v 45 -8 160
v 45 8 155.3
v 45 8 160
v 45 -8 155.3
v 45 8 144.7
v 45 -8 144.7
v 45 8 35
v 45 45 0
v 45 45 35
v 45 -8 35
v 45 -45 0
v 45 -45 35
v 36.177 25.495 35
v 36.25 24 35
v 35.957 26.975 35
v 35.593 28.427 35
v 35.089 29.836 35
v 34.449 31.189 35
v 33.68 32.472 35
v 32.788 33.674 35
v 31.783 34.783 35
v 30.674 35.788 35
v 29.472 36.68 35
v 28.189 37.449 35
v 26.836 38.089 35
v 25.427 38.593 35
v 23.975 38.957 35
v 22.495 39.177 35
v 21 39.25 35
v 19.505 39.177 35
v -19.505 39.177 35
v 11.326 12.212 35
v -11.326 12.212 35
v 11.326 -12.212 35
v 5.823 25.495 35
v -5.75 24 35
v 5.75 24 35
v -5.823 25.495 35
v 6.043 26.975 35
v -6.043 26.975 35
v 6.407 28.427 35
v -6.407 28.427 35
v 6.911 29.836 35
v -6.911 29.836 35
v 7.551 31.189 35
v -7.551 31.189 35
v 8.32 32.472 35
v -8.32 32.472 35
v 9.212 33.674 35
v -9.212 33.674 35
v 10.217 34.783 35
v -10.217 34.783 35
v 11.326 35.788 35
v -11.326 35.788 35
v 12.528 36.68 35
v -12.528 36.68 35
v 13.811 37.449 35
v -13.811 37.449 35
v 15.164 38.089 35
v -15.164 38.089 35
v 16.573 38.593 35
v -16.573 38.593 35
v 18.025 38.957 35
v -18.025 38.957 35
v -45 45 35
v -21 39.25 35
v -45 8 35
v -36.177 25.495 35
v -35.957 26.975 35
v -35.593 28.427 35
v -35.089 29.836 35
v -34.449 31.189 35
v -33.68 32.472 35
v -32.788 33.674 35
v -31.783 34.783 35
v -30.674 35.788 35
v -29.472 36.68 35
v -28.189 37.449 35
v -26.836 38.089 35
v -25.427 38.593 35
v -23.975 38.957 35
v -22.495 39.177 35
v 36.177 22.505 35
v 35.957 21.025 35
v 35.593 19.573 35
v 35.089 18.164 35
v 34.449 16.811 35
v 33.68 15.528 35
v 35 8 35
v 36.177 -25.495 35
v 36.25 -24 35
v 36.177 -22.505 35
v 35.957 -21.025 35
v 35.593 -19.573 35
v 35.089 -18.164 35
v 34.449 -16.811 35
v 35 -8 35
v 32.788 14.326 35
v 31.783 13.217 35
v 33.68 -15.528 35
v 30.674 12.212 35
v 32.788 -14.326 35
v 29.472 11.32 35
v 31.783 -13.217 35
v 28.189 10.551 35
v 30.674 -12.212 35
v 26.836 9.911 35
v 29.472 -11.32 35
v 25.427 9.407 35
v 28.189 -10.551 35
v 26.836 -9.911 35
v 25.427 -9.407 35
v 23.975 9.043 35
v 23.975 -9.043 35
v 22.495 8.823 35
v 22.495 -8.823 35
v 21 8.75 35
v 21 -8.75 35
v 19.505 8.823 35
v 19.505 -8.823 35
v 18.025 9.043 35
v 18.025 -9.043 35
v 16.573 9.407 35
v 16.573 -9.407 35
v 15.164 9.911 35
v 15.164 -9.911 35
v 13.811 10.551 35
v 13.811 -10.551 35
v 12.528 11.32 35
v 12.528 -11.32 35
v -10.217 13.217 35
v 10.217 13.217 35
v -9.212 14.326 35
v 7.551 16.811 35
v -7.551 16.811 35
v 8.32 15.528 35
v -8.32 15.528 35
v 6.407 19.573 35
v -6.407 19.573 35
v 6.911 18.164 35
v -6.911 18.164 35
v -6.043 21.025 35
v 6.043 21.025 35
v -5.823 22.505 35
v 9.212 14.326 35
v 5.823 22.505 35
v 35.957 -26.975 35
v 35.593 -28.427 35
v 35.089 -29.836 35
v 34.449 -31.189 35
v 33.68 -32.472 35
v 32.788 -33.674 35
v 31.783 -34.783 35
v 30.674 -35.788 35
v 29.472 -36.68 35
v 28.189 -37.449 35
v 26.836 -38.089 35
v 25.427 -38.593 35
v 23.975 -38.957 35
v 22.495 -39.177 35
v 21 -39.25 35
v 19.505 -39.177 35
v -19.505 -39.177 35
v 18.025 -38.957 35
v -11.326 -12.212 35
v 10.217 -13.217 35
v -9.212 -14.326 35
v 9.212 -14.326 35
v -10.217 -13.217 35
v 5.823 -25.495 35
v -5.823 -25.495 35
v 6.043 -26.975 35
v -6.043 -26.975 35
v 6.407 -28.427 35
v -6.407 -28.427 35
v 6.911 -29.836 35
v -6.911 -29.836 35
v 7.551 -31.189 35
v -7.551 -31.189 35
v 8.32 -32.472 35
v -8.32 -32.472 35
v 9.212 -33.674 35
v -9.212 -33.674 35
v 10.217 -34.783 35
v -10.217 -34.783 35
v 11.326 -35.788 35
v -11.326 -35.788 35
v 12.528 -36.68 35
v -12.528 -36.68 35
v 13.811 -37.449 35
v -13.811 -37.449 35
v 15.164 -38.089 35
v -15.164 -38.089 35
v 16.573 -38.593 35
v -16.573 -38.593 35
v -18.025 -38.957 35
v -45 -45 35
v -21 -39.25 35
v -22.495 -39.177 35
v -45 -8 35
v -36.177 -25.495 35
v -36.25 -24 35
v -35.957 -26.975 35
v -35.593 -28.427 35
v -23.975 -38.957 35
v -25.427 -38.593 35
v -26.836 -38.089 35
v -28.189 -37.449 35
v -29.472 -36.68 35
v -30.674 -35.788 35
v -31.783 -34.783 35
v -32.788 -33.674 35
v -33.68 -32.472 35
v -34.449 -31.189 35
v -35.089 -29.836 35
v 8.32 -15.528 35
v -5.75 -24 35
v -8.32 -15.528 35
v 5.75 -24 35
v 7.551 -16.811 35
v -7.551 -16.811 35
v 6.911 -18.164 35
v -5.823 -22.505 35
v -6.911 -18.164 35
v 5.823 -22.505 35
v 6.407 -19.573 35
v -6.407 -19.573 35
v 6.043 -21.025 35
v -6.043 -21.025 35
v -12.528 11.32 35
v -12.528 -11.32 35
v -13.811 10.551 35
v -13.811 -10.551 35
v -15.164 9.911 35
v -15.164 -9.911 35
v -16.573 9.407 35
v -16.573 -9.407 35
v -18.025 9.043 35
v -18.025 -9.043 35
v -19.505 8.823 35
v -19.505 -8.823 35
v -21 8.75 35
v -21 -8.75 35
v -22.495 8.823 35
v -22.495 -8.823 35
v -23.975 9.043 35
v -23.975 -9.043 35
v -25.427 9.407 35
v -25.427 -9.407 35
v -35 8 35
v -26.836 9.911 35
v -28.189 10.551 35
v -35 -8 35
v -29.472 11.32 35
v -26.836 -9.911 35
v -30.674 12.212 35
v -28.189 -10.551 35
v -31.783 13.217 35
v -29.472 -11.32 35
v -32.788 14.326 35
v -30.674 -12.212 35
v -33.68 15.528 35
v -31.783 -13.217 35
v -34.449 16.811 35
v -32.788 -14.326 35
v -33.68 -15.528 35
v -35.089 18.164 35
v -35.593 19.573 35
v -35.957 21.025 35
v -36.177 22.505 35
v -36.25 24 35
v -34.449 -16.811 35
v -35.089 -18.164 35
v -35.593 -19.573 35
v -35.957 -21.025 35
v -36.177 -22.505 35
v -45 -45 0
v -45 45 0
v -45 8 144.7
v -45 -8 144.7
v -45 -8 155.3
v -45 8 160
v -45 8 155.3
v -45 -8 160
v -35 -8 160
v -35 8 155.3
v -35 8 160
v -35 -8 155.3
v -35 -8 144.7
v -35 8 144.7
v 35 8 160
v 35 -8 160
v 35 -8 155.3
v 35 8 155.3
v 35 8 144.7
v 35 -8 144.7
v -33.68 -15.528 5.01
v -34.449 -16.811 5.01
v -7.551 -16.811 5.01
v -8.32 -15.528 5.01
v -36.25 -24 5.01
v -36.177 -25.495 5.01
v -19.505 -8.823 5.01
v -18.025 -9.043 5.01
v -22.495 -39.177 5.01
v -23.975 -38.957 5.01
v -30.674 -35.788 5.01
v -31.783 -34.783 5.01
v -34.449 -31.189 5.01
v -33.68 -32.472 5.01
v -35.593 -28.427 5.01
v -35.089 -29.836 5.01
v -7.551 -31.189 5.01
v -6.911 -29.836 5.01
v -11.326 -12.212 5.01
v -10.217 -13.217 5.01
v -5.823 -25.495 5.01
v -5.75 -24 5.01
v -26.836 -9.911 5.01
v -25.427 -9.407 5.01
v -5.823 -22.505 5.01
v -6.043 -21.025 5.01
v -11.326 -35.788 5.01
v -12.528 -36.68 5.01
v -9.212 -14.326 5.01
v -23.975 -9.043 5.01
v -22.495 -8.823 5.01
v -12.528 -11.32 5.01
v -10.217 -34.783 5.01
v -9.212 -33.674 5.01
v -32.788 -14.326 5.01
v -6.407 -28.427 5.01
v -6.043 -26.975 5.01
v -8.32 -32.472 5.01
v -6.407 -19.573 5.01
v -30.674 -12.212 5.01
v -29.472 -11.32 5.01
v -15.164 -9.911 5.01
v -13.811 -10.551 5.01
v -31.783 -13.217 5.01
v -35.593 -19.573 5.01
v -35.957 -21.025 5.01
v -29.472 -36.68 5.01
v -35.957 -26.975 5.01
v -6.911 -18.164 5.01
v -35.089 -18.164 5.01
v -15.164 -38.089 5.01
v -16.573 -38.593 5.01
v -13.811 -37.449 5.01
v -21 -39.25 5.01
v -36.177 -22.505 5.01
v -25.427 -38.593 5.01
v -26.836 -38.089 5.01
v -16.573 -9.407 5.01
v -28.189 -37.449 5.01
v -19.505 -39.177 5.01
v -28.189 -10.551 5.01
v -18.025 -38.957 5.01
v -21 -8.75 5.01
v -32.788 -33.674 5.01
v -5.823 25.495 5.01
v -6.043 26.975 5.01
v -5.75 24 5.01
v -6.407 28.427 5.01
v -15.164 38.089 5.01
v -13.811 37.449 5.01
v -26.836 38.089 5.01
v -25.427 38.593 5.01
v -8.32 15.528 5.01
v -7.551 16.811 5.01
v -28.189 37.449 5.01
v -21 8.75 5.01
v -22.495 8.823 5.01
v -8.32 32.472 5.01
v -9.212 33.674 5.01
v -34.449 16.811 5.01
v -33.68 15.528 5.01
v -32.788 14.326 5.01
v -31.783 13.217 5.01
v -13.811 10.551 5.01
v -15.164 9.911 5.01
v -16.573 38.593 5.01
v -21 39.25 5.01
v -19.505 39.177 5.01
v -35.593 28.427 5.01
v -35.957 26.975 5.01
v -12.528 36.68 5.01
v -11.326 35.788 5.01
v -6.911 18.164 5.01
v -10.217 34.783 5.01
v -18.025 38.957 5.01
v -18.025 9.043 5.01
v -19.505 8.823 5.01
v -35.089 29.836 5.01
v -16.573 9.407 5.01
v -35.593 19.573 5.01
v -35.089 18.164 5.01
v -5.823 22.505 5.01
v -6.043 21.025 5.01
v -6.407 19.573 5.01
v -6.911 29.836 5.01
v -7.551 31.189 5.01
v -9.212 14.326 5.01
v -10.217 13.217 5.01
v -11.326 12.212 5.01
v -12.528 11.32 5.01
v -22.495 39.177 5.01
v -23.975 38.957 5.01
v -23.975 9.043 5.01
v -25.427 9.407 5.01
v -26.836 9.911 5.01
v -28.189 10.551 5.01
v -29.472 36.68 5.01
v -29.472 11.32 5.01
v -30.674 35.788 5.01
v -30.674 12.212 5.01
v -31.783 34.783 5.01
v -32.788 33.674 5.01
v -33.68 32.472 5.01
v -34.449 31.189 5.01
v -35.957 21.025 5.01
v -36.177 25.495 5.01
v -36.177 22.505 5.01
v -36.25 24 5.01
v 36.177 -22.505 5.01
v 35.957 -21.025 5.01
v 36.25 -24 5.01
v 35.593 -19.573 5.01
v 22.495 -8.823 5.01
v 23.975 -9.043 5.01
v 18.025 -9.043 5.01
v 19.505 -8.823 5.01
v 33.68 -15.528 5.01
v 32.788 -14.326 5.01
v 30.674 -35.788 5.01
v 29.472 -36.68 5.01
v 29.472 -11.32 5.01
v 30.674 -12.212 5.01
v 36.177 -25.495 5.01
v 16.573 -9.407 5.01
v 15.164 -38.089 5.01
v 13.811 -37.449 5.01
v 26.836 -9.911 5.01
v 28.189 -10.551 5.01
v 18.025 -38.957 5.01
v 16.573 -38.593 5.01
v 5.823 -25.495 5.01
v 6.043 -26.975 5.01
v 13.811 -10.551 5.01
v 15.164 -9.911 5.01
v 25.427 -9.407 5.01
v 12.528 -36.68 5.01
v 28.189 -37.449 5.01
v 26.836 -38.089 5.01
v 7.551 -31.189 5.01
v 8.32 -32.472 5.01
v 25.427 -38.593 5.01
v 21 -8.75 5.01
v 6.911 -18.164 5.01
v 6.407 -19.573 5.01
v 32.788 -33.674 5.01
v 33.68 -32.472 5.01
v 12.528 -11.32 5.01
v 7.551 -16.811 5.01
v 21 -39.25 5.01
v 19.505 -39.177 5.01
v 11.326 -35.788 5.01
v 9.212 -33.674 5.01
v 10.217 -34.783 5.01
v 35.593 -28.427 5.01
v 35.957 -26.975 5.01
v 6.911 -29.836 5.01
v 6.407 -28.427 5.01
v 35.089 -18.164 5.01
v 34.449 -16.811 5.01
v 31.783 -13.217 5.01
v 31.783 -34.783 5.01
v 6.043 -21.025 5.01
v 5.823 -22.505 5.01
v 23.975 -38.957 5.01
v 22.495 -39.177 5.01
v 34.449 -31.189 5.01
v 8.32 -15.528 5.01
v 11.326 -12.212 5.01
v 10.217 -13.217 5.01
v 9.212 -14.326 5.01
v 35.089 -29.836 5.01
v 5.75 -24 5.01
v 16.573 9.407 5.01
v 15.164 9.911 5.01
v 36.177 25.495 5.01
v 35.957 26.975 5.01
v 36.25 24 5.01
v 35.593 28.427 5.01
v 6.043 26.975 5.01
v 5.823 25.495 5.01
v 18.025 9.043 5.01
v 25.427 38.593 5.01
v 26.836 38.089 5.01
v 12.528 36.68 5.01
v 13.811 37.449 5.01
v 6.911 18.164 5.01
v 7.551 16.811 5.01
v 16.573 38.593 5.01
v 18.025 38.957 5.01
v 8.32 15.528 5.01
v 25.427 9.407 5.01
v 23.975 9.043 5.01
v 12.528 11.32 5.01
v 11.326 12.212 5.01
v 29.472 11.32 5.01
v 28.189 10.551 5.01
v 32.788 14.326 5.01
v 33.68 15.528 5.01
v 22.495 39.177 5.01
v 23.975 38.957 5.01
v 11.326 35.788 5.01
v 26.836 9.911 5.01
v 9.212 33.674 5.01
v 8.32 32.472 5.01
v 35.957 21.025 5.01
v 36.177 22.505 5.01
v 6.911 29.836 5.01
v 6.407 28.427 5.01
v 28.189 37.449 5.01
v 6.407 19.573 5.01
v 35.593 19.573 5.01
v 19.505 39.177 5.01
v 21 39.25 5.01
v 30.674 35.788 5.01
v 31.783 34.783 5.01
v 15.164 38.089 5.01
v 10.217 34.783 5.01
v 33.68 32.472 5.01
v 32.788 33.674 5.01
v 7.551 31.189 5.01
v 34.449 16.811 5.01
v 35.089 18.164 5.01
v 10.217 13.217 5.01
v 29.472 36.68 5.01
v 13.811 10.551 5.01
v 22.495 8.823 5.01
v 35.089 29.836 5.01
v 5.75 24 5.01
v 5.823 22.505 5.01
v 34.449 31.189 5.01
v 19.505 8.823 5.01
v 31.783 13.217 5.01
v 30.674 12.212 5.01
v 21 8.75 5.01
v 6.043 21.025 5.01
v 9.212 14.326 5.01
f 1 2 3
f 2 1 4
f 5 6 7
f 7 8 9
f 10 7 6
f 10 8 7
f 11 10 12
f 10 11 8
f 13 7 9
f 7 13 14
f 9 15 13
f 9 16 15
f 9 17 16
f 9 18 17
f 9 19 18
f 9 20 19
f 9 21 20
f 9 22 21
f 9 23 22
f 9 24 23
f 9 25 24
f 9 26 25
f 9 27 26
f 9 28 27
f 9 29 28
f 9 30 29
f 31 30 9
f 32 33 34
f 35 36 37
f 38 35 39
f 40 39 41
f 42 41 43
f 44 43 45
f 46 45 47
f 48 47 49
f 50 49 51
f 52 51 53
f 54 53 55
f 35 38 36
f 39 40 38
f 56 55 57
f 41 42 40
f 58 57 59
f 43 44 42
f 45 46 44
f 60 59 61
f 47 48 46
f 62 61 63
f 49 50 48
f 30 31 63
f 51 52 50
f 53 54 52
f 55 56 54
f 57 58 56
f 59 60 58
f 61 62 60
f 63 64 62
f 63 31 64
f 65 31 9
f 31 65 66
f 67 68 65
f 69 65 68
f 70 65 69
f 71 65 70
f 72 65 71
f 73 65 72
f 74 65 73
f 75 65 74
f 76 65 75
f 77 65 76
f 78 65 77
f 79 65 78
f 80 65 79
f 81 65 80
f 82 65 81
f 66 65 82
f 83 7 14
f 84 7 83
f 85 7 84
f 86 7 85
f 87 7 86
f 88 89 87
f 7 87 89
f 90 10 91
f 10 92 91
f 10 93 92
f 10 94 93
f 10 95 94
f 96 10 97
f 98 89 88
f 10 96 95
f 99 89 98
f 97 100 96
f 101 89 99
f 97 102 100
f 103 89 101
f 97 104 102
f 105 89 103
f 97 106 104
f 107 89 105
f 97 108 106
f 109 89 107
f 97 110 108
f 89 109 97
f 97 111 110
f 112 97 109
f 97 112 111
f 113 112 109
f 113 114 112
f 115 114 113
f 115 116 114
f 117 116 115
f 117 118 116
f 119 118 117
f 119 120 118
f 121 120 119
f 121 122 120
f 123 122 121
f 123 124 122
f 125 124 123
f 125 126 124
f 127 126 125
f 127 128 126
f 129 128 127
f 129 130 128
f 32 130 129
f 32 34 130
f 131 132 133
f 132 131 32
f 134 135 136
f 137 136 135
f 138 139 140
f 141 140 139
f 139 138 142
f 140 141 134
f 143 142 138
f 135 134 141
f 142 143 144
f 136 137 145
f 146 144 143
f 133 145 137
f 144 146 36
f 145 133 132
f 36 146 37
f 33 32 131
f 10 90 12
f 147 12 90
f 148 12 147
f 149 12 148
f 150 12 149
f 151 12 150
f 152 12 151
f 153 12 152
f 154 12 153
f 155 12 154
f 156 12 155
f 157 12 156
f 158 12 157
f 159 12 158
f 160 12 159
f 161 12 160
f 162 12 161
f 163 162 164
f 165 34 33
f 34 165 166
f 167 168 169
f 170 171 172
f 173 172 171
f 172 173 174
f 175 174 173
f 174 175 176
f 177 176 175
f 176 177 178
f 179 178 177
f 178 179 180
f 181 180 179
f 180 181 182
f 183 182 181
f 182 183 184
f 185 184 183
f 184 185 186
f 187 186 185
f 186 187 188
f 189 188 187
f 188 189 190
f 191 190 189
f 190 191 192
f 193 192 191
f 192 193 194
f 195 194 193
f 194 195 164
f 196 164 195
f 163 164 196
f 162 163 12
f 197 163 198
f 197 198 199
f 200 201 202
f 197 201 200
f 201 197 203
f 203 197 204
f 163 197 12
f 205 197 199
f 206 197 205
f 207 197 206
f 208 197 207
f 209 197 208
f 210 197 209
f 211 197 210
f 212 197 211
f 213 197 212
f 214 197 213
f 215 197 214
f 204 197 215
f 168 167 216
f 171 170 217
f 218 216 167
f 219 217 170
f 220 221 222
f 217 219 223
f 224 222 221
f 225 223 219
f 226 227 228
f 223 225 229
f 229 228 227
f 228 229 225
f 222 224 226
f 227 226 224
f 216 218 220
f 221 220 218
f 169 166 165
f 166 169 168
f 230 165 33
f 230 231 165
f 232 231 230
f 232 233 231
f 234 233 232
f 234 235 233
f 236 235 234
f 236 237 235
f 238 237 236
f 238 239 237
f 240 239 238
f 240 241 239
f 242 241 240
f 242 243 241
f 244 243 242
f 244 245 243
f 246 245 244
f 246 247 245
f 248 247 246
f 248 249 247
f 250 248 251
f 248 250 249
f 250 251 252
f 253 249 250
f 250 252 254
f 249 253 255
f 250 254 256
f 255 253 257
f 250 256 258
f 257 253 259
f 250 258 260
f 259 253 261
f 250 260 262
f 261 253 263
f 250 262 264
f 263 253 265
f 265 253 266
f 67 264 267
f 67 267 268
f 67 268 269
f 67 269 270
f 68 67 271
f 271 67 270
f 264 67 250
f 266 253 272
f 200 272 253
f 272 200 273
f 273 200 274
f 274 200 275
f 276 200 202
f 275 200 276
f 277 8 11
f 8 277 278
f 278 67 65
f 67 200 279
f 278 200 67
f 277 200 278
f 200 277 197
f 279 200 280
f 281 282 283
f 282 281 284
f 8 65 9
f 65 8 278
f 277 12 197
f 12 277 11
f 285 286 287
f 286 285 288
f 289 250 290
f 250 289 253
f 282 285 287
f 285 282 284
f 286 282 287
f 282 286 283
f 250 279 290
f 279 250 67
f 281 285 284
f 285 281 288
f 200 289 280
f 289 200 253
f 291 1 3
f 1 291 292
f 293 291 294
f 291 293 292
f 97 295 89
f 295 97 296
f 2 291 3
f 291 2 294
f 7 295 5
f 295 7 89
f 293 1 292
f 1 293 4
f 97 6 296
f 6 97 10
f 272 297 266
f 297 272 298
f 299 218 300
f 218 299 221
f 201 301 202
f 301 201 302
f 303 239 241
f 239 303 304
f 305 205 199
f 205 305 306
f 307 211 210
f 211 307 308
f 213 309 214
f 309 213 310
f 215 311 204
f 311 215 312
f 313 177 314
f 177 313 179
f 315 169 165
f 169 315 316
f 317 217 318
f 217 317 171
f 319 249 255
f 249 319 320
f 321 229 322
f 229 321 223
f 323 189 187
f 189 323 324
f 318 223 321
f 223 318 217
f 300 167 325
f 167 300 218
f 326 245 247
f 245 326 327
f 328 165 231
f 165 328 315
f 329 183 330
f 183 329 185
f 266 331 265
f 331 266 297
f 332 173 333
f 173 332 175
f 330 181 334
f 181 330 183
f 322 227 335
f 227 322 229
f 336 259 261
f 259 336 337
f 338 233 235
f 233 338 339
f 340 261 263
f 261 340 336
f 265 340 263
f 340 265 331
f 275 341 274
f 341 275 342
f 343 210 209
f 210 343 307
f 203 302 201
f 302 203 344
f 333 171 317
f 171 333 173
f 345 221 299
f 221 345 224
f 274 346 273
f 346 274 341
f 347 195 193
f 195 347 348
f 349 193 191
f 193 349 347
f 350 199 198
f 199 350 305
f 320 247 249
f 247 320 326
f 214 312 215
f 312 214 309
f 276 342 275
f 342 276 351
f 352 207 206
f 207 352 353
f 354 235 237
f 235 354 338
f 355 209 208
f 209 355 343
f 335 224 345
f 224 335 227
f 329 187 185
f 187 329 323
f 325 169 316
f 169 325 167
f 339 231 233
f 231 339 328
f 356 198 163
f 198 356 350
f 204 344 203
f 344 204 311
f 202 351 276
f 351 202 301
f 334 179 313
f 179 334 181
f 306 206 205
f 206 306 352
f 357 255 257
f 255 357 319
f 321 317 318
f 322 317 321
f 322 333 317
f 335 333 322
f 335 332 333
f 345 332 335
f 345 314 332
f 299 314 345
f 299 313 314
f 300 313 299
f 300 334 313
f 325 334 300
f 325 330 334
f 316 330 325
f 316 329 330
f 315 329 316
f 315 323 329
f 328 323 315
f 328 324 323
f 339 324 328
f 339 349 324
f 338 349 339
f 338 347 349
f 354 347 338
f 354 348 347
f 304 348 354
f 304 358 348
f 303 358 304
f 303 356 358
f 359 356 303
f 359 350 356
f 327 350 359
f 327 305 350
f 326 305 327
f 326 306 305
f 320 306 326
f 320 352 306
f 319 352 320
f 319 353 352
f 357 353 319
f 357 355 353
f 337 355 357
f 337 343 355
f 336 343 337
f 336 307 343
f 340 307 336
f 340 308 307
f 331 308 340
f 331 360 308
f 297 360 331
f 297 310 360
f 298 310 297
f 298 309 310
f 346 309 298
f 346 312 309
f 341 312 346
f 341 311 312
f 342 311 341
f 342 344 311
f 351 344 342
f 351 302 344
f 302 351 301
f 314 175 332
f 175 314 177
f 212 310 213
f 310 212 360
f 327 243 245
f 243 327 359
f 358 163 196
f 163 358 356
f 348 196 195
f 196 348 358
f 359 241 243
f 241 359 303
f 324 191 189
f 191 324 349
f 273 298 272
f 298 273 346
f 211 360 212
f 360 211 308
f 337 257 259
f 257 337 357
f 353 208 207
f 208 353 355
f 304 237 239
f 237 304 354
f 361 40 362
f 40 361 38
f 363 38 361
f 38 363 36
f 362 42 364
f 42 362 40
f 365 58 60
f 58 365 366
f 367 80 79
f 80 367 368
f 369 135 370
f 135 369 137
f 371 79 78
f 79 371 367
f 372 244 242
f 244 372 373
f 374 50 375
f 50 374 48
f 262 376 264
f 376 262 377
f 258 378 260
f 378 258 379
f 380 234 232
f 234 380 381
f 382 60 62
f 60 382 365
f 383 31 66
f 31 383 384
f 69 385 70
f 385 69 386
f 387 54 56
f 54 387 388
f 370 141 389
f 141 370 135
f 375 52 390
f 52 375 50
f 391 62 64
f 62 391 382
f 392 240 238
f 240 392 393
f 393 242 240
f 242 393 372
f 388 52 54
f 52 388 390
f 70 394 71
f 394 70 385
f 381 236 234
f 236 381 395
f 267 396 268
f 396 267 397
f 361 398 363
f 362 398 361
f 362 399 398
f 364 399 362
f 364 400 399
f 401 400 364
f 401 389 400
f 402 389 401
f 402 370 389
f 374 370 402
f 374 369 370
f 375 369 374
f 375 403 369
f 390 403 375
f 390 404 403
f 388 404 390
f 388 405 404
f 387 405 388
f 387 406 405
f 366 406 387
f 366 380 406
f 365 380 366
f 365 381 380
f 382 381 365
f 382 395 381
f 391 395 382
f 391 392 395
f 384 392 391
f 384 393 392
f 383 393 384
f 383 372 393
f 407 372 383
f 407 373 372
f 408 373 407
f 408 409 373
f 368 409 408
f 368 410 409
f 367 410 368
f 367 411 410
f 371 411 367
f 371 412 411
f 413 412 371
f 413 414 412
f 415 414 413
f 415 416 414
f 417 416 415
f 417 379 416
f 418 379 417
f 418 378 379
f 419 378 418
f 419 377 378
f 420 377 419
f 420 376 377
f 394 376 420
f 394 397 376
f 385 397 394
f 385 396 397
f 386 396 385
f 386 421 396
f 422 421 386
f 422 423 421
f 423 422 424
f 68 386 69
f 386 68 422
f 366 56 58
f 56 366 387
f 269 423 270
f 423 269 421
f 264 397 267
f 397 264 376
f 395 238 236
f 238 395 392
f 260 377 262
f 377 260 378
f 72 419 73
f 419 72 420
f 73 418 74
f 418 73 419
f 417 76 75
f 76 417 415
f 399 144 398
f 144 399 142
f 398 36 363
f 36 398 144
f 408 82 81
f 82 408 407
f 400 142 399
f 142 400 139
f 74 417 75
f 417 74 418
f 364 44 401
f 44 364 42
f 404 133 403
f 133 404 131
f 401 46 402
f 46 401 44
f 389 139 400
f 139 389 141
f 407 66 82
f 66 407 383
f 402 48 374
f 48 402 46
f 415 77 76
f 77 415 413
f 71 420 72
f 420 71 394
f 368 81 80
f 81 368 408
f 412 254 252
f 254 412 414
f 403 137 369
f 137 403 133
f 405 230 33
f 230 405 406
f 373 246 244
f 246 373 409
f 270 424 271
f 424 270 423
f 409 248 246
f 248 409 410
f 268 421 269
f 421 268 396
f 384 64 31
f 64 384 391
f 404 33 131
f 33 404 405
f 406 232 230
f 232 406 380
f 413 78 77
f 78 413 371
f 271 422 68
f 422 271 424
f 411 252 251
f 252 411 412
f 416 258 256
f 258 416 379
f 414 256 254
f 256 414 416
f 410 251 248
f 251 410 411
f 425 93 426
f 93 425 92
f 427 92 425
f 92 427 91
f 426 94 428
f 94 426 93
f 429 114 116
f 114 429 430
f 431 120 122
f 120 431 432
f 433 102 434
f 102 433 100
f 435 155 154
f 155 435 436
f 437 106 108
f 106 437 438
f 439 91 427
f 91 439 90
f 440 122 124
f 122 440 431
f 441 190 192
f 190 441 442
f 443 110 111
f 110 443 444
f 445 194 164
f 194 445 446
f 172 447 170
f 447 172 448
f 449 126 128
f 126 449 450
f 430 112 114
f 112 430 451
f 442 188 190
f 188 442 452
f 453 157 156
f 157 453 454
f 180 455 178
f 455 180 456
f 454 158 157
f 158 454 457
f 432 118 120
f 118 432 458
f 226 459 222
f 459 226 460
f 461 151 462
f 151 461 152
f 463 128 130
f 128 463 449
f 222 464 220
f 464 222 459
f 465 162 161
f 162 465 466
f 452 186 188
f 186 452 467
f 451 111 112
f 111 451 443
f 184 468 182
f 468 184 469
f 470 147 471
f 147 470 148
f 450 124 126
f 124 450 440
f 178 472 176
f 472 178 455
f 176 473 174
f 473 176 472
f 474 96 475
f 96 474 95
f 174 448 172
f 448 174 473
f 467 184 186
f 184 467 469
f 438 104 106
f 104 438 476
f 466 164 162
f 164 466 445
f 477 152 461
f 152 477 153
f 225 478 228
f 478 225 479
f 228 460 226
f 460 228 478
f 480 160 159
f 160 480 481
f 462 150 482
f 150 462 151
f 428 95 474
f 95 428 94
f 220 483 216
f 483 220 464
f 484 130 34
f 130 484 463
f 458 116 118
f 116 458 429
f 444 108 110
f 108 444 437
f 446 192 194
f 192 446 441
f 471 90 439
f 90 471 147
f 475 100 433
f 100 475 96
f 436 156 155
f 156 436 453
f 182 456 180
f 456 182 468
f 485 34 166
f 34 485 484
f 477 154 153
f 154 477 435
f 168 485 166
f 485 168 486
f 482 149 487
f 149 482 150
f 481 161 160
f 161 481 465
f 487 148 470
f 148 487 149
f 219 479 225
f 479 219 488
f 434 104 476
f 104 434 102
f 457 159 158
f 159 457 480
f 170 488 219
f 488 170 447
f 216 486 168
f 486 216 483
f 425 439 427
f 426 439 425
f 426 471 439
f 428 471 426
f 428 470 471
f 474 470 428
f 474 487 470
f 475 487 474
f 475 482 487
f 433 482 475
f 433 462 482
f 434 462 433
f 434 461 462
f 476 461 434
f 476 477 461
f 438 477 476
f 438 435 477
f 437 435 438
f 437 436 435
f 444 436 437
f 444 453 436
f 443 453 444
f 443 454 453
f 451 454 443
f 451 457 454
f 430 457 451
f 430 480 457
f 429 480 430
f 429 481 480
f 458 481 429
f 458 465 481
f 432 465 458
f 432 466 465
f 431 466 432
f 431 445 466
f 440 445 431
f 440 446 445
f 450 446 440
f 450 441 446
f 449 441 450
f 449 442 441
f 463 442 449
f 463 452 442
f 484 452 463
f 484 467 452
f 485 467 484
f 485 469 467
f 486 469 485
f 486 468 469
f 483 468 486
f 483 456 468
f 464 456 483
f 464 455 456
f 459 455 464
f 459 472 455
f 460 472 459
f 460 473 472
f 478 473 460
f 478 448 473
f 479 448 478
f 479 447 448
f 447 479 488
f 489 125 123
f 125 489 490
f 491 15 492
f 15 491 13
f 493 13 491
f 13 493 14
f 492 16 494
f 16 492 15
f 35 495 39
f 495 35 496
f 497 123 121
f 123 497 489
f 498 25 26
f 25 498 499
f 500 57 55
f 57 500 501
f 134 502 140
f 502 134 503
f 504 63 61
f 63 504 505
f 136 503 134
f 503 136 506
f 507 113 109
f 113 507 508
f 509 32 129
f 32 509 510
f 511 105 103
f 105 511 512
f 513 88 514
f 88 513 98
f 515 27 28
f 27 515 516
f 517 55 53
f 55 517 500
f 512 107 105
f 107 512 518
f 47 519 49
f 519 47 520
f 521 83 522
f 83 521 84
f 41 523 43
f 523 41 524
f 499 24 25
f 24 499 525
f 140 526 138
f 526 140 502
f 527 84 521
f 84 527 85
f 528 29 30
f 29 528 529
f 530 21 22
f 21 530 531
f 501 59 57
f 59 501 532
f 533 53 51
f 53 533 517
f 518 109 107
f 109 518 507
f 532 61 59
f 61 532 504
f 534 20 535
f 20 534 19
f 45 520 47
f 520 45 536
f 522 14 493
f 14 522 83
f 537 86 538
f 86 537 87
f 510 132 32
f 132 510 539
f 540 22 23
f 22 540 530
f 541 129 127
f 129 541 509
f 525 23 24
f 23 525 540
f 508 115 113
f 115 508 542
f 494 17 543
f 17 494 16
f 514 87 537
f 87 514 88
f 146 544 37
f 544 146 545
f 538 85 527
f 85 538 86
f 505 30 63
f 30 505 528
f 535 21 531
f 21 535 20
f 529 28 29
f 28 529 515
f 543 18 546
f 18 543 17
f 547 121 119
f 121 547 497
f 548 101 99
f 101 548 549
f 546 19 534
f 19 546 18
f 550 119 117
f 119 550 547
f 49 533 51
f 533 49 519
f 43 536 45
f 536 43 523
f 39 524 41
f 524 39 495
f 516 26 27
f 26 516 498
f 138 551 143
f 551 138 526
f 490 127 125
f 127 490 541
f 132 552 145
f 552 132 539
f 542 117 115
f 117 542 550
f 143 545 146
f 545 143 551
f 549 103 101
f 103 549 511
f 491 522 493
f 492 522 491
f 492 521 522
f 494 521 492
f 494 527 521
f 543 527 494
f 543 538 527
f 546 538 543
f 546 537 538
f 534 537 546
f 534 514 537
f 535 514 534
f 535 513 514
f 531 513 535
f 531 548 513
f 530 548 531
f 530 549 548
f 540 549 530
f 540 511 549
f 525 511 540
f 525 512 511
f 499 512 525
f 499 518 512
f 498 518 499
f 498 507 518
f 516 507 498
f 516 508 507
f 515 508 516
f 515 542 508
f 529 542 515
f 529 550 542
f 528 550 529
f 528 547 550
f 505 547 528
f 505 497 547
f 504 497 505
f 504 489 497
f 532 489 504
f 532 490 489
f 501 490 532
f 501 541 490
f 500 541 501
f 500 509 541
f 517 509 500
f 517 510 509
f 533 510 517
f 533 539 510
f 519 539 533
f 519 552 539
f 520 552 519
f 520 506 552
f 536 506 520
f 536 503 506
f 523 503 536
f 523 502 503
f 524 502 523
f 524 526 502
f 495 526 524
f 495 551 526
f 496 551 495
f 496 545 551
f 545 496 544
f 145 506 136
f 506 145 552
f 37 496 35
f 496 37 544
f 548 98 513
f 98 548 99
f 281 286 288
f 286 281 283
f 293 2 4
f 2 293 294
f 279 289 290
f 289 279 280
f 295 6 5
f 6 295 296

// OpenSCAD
// Part 1: Base Block with tube seats and posts
// Part 2: Handle Bar

// --- Dimensions Part 1 ---
base_x      = 90.0;    // Base length (X)
base_y      = 90.0;    // Base width (Y)
base_z      = 35.0;    // Base height (Z)

seat_d      = 30.5;    // Diameter of tube seats
seat_depth  = 30.0;    // Depth of tube seats
seat_floor  = 5.0;     // Remaining floor thickness

seat_x_pos  = 21.0;    // X offset for seats
seat_y_pos  = 24.0;    // Y offset for seats

post_x_thick = 10.0;   // Thickness of posts (X direction)
post_y_wide  = 16.0;   // Width of posts (Y direction)
post_z_high  = 160.0;  // Total height of posts (Z)

hole_size   = 10.4;    // Square hole size (X-axis through posts)
hole_z_pos  = 150.0;   // Z height of the hole center

// --- Dimensions Part 2 ---
handle_x    = 100.0;   // Length of handle (X)
handle_y    = 10.0;    // Width of handle (Y)
handle_z    = 10.0;    // Height of handle (Z)
handle_y_gap = 10.0;   // Gap between base +Y face and handle (Y direction)

// Calculated positions
handle_y_start = (base_y / 2) + handle_y_gap;

$fn = 64;

// --- MODULE: PART 1 ---
module part_1() {
    difference() {
        // The main body (Base + Posts)
        union() {
            // Main Base Block
            translate([-base_x/2, -base_y/2, 0])
                cube([base_x, base_y, base_z]);
            
            // Post 1 (at -X end, flush with end face)
            translate([-base_x/2, -post_y_wide/2, base_z])
                cube([post_x_thick, post_y_wide, post_z_high - base_z]);
            
            // Post 2 (at +X end, flush with end face)
            translate([base_x/2 - post_x_thick, -post_y_wide/2, base_z])
                cube([post_x_thick, post_y_wide, post_z_high - base_z]);
        }

        // Tube Seats (Blind holes)
        for (sx = [-seat_x_pos, seat_x_pos]) {
            for (sy = [-seat_y_pos, seat_y_pos]) {
                translate([sx, sy, base_z - seat_depth + 0.01])
                    cylinder(h = seat_depth + 0.1, d = seat_d);
            }
        }

        // Square holes through posts
        // We use a single cube that spans the entire X range of the base 
        // and is slightly larger in Y and Z to ensure a clean cut through the posts.
        translate([-base_x/2 - 1, -post_y_wide/2 - 1, hole_z_pos - hole_size/2 - 0.1])
            cube([base_x + 2, post_y_wide + 2, hole_size + 0.2]);
    }
}

// --- MODULE: PART 2 ---
module part_2() {
    // Handle is a square bar 10x10, 100 long, centered on X.
    // Spans Y from 55 to 65.
    translate([-handle_x/2, handle_y_start, 0])
        cube([handle_x, handle_y, handle_z]);
}

// --- RENDERING ---
// To view Part 1:
part_1();

// To view Part 2 (uncomment below and comment part_1 above to see separately):
// translate([0, 100, 0]) part_2();
